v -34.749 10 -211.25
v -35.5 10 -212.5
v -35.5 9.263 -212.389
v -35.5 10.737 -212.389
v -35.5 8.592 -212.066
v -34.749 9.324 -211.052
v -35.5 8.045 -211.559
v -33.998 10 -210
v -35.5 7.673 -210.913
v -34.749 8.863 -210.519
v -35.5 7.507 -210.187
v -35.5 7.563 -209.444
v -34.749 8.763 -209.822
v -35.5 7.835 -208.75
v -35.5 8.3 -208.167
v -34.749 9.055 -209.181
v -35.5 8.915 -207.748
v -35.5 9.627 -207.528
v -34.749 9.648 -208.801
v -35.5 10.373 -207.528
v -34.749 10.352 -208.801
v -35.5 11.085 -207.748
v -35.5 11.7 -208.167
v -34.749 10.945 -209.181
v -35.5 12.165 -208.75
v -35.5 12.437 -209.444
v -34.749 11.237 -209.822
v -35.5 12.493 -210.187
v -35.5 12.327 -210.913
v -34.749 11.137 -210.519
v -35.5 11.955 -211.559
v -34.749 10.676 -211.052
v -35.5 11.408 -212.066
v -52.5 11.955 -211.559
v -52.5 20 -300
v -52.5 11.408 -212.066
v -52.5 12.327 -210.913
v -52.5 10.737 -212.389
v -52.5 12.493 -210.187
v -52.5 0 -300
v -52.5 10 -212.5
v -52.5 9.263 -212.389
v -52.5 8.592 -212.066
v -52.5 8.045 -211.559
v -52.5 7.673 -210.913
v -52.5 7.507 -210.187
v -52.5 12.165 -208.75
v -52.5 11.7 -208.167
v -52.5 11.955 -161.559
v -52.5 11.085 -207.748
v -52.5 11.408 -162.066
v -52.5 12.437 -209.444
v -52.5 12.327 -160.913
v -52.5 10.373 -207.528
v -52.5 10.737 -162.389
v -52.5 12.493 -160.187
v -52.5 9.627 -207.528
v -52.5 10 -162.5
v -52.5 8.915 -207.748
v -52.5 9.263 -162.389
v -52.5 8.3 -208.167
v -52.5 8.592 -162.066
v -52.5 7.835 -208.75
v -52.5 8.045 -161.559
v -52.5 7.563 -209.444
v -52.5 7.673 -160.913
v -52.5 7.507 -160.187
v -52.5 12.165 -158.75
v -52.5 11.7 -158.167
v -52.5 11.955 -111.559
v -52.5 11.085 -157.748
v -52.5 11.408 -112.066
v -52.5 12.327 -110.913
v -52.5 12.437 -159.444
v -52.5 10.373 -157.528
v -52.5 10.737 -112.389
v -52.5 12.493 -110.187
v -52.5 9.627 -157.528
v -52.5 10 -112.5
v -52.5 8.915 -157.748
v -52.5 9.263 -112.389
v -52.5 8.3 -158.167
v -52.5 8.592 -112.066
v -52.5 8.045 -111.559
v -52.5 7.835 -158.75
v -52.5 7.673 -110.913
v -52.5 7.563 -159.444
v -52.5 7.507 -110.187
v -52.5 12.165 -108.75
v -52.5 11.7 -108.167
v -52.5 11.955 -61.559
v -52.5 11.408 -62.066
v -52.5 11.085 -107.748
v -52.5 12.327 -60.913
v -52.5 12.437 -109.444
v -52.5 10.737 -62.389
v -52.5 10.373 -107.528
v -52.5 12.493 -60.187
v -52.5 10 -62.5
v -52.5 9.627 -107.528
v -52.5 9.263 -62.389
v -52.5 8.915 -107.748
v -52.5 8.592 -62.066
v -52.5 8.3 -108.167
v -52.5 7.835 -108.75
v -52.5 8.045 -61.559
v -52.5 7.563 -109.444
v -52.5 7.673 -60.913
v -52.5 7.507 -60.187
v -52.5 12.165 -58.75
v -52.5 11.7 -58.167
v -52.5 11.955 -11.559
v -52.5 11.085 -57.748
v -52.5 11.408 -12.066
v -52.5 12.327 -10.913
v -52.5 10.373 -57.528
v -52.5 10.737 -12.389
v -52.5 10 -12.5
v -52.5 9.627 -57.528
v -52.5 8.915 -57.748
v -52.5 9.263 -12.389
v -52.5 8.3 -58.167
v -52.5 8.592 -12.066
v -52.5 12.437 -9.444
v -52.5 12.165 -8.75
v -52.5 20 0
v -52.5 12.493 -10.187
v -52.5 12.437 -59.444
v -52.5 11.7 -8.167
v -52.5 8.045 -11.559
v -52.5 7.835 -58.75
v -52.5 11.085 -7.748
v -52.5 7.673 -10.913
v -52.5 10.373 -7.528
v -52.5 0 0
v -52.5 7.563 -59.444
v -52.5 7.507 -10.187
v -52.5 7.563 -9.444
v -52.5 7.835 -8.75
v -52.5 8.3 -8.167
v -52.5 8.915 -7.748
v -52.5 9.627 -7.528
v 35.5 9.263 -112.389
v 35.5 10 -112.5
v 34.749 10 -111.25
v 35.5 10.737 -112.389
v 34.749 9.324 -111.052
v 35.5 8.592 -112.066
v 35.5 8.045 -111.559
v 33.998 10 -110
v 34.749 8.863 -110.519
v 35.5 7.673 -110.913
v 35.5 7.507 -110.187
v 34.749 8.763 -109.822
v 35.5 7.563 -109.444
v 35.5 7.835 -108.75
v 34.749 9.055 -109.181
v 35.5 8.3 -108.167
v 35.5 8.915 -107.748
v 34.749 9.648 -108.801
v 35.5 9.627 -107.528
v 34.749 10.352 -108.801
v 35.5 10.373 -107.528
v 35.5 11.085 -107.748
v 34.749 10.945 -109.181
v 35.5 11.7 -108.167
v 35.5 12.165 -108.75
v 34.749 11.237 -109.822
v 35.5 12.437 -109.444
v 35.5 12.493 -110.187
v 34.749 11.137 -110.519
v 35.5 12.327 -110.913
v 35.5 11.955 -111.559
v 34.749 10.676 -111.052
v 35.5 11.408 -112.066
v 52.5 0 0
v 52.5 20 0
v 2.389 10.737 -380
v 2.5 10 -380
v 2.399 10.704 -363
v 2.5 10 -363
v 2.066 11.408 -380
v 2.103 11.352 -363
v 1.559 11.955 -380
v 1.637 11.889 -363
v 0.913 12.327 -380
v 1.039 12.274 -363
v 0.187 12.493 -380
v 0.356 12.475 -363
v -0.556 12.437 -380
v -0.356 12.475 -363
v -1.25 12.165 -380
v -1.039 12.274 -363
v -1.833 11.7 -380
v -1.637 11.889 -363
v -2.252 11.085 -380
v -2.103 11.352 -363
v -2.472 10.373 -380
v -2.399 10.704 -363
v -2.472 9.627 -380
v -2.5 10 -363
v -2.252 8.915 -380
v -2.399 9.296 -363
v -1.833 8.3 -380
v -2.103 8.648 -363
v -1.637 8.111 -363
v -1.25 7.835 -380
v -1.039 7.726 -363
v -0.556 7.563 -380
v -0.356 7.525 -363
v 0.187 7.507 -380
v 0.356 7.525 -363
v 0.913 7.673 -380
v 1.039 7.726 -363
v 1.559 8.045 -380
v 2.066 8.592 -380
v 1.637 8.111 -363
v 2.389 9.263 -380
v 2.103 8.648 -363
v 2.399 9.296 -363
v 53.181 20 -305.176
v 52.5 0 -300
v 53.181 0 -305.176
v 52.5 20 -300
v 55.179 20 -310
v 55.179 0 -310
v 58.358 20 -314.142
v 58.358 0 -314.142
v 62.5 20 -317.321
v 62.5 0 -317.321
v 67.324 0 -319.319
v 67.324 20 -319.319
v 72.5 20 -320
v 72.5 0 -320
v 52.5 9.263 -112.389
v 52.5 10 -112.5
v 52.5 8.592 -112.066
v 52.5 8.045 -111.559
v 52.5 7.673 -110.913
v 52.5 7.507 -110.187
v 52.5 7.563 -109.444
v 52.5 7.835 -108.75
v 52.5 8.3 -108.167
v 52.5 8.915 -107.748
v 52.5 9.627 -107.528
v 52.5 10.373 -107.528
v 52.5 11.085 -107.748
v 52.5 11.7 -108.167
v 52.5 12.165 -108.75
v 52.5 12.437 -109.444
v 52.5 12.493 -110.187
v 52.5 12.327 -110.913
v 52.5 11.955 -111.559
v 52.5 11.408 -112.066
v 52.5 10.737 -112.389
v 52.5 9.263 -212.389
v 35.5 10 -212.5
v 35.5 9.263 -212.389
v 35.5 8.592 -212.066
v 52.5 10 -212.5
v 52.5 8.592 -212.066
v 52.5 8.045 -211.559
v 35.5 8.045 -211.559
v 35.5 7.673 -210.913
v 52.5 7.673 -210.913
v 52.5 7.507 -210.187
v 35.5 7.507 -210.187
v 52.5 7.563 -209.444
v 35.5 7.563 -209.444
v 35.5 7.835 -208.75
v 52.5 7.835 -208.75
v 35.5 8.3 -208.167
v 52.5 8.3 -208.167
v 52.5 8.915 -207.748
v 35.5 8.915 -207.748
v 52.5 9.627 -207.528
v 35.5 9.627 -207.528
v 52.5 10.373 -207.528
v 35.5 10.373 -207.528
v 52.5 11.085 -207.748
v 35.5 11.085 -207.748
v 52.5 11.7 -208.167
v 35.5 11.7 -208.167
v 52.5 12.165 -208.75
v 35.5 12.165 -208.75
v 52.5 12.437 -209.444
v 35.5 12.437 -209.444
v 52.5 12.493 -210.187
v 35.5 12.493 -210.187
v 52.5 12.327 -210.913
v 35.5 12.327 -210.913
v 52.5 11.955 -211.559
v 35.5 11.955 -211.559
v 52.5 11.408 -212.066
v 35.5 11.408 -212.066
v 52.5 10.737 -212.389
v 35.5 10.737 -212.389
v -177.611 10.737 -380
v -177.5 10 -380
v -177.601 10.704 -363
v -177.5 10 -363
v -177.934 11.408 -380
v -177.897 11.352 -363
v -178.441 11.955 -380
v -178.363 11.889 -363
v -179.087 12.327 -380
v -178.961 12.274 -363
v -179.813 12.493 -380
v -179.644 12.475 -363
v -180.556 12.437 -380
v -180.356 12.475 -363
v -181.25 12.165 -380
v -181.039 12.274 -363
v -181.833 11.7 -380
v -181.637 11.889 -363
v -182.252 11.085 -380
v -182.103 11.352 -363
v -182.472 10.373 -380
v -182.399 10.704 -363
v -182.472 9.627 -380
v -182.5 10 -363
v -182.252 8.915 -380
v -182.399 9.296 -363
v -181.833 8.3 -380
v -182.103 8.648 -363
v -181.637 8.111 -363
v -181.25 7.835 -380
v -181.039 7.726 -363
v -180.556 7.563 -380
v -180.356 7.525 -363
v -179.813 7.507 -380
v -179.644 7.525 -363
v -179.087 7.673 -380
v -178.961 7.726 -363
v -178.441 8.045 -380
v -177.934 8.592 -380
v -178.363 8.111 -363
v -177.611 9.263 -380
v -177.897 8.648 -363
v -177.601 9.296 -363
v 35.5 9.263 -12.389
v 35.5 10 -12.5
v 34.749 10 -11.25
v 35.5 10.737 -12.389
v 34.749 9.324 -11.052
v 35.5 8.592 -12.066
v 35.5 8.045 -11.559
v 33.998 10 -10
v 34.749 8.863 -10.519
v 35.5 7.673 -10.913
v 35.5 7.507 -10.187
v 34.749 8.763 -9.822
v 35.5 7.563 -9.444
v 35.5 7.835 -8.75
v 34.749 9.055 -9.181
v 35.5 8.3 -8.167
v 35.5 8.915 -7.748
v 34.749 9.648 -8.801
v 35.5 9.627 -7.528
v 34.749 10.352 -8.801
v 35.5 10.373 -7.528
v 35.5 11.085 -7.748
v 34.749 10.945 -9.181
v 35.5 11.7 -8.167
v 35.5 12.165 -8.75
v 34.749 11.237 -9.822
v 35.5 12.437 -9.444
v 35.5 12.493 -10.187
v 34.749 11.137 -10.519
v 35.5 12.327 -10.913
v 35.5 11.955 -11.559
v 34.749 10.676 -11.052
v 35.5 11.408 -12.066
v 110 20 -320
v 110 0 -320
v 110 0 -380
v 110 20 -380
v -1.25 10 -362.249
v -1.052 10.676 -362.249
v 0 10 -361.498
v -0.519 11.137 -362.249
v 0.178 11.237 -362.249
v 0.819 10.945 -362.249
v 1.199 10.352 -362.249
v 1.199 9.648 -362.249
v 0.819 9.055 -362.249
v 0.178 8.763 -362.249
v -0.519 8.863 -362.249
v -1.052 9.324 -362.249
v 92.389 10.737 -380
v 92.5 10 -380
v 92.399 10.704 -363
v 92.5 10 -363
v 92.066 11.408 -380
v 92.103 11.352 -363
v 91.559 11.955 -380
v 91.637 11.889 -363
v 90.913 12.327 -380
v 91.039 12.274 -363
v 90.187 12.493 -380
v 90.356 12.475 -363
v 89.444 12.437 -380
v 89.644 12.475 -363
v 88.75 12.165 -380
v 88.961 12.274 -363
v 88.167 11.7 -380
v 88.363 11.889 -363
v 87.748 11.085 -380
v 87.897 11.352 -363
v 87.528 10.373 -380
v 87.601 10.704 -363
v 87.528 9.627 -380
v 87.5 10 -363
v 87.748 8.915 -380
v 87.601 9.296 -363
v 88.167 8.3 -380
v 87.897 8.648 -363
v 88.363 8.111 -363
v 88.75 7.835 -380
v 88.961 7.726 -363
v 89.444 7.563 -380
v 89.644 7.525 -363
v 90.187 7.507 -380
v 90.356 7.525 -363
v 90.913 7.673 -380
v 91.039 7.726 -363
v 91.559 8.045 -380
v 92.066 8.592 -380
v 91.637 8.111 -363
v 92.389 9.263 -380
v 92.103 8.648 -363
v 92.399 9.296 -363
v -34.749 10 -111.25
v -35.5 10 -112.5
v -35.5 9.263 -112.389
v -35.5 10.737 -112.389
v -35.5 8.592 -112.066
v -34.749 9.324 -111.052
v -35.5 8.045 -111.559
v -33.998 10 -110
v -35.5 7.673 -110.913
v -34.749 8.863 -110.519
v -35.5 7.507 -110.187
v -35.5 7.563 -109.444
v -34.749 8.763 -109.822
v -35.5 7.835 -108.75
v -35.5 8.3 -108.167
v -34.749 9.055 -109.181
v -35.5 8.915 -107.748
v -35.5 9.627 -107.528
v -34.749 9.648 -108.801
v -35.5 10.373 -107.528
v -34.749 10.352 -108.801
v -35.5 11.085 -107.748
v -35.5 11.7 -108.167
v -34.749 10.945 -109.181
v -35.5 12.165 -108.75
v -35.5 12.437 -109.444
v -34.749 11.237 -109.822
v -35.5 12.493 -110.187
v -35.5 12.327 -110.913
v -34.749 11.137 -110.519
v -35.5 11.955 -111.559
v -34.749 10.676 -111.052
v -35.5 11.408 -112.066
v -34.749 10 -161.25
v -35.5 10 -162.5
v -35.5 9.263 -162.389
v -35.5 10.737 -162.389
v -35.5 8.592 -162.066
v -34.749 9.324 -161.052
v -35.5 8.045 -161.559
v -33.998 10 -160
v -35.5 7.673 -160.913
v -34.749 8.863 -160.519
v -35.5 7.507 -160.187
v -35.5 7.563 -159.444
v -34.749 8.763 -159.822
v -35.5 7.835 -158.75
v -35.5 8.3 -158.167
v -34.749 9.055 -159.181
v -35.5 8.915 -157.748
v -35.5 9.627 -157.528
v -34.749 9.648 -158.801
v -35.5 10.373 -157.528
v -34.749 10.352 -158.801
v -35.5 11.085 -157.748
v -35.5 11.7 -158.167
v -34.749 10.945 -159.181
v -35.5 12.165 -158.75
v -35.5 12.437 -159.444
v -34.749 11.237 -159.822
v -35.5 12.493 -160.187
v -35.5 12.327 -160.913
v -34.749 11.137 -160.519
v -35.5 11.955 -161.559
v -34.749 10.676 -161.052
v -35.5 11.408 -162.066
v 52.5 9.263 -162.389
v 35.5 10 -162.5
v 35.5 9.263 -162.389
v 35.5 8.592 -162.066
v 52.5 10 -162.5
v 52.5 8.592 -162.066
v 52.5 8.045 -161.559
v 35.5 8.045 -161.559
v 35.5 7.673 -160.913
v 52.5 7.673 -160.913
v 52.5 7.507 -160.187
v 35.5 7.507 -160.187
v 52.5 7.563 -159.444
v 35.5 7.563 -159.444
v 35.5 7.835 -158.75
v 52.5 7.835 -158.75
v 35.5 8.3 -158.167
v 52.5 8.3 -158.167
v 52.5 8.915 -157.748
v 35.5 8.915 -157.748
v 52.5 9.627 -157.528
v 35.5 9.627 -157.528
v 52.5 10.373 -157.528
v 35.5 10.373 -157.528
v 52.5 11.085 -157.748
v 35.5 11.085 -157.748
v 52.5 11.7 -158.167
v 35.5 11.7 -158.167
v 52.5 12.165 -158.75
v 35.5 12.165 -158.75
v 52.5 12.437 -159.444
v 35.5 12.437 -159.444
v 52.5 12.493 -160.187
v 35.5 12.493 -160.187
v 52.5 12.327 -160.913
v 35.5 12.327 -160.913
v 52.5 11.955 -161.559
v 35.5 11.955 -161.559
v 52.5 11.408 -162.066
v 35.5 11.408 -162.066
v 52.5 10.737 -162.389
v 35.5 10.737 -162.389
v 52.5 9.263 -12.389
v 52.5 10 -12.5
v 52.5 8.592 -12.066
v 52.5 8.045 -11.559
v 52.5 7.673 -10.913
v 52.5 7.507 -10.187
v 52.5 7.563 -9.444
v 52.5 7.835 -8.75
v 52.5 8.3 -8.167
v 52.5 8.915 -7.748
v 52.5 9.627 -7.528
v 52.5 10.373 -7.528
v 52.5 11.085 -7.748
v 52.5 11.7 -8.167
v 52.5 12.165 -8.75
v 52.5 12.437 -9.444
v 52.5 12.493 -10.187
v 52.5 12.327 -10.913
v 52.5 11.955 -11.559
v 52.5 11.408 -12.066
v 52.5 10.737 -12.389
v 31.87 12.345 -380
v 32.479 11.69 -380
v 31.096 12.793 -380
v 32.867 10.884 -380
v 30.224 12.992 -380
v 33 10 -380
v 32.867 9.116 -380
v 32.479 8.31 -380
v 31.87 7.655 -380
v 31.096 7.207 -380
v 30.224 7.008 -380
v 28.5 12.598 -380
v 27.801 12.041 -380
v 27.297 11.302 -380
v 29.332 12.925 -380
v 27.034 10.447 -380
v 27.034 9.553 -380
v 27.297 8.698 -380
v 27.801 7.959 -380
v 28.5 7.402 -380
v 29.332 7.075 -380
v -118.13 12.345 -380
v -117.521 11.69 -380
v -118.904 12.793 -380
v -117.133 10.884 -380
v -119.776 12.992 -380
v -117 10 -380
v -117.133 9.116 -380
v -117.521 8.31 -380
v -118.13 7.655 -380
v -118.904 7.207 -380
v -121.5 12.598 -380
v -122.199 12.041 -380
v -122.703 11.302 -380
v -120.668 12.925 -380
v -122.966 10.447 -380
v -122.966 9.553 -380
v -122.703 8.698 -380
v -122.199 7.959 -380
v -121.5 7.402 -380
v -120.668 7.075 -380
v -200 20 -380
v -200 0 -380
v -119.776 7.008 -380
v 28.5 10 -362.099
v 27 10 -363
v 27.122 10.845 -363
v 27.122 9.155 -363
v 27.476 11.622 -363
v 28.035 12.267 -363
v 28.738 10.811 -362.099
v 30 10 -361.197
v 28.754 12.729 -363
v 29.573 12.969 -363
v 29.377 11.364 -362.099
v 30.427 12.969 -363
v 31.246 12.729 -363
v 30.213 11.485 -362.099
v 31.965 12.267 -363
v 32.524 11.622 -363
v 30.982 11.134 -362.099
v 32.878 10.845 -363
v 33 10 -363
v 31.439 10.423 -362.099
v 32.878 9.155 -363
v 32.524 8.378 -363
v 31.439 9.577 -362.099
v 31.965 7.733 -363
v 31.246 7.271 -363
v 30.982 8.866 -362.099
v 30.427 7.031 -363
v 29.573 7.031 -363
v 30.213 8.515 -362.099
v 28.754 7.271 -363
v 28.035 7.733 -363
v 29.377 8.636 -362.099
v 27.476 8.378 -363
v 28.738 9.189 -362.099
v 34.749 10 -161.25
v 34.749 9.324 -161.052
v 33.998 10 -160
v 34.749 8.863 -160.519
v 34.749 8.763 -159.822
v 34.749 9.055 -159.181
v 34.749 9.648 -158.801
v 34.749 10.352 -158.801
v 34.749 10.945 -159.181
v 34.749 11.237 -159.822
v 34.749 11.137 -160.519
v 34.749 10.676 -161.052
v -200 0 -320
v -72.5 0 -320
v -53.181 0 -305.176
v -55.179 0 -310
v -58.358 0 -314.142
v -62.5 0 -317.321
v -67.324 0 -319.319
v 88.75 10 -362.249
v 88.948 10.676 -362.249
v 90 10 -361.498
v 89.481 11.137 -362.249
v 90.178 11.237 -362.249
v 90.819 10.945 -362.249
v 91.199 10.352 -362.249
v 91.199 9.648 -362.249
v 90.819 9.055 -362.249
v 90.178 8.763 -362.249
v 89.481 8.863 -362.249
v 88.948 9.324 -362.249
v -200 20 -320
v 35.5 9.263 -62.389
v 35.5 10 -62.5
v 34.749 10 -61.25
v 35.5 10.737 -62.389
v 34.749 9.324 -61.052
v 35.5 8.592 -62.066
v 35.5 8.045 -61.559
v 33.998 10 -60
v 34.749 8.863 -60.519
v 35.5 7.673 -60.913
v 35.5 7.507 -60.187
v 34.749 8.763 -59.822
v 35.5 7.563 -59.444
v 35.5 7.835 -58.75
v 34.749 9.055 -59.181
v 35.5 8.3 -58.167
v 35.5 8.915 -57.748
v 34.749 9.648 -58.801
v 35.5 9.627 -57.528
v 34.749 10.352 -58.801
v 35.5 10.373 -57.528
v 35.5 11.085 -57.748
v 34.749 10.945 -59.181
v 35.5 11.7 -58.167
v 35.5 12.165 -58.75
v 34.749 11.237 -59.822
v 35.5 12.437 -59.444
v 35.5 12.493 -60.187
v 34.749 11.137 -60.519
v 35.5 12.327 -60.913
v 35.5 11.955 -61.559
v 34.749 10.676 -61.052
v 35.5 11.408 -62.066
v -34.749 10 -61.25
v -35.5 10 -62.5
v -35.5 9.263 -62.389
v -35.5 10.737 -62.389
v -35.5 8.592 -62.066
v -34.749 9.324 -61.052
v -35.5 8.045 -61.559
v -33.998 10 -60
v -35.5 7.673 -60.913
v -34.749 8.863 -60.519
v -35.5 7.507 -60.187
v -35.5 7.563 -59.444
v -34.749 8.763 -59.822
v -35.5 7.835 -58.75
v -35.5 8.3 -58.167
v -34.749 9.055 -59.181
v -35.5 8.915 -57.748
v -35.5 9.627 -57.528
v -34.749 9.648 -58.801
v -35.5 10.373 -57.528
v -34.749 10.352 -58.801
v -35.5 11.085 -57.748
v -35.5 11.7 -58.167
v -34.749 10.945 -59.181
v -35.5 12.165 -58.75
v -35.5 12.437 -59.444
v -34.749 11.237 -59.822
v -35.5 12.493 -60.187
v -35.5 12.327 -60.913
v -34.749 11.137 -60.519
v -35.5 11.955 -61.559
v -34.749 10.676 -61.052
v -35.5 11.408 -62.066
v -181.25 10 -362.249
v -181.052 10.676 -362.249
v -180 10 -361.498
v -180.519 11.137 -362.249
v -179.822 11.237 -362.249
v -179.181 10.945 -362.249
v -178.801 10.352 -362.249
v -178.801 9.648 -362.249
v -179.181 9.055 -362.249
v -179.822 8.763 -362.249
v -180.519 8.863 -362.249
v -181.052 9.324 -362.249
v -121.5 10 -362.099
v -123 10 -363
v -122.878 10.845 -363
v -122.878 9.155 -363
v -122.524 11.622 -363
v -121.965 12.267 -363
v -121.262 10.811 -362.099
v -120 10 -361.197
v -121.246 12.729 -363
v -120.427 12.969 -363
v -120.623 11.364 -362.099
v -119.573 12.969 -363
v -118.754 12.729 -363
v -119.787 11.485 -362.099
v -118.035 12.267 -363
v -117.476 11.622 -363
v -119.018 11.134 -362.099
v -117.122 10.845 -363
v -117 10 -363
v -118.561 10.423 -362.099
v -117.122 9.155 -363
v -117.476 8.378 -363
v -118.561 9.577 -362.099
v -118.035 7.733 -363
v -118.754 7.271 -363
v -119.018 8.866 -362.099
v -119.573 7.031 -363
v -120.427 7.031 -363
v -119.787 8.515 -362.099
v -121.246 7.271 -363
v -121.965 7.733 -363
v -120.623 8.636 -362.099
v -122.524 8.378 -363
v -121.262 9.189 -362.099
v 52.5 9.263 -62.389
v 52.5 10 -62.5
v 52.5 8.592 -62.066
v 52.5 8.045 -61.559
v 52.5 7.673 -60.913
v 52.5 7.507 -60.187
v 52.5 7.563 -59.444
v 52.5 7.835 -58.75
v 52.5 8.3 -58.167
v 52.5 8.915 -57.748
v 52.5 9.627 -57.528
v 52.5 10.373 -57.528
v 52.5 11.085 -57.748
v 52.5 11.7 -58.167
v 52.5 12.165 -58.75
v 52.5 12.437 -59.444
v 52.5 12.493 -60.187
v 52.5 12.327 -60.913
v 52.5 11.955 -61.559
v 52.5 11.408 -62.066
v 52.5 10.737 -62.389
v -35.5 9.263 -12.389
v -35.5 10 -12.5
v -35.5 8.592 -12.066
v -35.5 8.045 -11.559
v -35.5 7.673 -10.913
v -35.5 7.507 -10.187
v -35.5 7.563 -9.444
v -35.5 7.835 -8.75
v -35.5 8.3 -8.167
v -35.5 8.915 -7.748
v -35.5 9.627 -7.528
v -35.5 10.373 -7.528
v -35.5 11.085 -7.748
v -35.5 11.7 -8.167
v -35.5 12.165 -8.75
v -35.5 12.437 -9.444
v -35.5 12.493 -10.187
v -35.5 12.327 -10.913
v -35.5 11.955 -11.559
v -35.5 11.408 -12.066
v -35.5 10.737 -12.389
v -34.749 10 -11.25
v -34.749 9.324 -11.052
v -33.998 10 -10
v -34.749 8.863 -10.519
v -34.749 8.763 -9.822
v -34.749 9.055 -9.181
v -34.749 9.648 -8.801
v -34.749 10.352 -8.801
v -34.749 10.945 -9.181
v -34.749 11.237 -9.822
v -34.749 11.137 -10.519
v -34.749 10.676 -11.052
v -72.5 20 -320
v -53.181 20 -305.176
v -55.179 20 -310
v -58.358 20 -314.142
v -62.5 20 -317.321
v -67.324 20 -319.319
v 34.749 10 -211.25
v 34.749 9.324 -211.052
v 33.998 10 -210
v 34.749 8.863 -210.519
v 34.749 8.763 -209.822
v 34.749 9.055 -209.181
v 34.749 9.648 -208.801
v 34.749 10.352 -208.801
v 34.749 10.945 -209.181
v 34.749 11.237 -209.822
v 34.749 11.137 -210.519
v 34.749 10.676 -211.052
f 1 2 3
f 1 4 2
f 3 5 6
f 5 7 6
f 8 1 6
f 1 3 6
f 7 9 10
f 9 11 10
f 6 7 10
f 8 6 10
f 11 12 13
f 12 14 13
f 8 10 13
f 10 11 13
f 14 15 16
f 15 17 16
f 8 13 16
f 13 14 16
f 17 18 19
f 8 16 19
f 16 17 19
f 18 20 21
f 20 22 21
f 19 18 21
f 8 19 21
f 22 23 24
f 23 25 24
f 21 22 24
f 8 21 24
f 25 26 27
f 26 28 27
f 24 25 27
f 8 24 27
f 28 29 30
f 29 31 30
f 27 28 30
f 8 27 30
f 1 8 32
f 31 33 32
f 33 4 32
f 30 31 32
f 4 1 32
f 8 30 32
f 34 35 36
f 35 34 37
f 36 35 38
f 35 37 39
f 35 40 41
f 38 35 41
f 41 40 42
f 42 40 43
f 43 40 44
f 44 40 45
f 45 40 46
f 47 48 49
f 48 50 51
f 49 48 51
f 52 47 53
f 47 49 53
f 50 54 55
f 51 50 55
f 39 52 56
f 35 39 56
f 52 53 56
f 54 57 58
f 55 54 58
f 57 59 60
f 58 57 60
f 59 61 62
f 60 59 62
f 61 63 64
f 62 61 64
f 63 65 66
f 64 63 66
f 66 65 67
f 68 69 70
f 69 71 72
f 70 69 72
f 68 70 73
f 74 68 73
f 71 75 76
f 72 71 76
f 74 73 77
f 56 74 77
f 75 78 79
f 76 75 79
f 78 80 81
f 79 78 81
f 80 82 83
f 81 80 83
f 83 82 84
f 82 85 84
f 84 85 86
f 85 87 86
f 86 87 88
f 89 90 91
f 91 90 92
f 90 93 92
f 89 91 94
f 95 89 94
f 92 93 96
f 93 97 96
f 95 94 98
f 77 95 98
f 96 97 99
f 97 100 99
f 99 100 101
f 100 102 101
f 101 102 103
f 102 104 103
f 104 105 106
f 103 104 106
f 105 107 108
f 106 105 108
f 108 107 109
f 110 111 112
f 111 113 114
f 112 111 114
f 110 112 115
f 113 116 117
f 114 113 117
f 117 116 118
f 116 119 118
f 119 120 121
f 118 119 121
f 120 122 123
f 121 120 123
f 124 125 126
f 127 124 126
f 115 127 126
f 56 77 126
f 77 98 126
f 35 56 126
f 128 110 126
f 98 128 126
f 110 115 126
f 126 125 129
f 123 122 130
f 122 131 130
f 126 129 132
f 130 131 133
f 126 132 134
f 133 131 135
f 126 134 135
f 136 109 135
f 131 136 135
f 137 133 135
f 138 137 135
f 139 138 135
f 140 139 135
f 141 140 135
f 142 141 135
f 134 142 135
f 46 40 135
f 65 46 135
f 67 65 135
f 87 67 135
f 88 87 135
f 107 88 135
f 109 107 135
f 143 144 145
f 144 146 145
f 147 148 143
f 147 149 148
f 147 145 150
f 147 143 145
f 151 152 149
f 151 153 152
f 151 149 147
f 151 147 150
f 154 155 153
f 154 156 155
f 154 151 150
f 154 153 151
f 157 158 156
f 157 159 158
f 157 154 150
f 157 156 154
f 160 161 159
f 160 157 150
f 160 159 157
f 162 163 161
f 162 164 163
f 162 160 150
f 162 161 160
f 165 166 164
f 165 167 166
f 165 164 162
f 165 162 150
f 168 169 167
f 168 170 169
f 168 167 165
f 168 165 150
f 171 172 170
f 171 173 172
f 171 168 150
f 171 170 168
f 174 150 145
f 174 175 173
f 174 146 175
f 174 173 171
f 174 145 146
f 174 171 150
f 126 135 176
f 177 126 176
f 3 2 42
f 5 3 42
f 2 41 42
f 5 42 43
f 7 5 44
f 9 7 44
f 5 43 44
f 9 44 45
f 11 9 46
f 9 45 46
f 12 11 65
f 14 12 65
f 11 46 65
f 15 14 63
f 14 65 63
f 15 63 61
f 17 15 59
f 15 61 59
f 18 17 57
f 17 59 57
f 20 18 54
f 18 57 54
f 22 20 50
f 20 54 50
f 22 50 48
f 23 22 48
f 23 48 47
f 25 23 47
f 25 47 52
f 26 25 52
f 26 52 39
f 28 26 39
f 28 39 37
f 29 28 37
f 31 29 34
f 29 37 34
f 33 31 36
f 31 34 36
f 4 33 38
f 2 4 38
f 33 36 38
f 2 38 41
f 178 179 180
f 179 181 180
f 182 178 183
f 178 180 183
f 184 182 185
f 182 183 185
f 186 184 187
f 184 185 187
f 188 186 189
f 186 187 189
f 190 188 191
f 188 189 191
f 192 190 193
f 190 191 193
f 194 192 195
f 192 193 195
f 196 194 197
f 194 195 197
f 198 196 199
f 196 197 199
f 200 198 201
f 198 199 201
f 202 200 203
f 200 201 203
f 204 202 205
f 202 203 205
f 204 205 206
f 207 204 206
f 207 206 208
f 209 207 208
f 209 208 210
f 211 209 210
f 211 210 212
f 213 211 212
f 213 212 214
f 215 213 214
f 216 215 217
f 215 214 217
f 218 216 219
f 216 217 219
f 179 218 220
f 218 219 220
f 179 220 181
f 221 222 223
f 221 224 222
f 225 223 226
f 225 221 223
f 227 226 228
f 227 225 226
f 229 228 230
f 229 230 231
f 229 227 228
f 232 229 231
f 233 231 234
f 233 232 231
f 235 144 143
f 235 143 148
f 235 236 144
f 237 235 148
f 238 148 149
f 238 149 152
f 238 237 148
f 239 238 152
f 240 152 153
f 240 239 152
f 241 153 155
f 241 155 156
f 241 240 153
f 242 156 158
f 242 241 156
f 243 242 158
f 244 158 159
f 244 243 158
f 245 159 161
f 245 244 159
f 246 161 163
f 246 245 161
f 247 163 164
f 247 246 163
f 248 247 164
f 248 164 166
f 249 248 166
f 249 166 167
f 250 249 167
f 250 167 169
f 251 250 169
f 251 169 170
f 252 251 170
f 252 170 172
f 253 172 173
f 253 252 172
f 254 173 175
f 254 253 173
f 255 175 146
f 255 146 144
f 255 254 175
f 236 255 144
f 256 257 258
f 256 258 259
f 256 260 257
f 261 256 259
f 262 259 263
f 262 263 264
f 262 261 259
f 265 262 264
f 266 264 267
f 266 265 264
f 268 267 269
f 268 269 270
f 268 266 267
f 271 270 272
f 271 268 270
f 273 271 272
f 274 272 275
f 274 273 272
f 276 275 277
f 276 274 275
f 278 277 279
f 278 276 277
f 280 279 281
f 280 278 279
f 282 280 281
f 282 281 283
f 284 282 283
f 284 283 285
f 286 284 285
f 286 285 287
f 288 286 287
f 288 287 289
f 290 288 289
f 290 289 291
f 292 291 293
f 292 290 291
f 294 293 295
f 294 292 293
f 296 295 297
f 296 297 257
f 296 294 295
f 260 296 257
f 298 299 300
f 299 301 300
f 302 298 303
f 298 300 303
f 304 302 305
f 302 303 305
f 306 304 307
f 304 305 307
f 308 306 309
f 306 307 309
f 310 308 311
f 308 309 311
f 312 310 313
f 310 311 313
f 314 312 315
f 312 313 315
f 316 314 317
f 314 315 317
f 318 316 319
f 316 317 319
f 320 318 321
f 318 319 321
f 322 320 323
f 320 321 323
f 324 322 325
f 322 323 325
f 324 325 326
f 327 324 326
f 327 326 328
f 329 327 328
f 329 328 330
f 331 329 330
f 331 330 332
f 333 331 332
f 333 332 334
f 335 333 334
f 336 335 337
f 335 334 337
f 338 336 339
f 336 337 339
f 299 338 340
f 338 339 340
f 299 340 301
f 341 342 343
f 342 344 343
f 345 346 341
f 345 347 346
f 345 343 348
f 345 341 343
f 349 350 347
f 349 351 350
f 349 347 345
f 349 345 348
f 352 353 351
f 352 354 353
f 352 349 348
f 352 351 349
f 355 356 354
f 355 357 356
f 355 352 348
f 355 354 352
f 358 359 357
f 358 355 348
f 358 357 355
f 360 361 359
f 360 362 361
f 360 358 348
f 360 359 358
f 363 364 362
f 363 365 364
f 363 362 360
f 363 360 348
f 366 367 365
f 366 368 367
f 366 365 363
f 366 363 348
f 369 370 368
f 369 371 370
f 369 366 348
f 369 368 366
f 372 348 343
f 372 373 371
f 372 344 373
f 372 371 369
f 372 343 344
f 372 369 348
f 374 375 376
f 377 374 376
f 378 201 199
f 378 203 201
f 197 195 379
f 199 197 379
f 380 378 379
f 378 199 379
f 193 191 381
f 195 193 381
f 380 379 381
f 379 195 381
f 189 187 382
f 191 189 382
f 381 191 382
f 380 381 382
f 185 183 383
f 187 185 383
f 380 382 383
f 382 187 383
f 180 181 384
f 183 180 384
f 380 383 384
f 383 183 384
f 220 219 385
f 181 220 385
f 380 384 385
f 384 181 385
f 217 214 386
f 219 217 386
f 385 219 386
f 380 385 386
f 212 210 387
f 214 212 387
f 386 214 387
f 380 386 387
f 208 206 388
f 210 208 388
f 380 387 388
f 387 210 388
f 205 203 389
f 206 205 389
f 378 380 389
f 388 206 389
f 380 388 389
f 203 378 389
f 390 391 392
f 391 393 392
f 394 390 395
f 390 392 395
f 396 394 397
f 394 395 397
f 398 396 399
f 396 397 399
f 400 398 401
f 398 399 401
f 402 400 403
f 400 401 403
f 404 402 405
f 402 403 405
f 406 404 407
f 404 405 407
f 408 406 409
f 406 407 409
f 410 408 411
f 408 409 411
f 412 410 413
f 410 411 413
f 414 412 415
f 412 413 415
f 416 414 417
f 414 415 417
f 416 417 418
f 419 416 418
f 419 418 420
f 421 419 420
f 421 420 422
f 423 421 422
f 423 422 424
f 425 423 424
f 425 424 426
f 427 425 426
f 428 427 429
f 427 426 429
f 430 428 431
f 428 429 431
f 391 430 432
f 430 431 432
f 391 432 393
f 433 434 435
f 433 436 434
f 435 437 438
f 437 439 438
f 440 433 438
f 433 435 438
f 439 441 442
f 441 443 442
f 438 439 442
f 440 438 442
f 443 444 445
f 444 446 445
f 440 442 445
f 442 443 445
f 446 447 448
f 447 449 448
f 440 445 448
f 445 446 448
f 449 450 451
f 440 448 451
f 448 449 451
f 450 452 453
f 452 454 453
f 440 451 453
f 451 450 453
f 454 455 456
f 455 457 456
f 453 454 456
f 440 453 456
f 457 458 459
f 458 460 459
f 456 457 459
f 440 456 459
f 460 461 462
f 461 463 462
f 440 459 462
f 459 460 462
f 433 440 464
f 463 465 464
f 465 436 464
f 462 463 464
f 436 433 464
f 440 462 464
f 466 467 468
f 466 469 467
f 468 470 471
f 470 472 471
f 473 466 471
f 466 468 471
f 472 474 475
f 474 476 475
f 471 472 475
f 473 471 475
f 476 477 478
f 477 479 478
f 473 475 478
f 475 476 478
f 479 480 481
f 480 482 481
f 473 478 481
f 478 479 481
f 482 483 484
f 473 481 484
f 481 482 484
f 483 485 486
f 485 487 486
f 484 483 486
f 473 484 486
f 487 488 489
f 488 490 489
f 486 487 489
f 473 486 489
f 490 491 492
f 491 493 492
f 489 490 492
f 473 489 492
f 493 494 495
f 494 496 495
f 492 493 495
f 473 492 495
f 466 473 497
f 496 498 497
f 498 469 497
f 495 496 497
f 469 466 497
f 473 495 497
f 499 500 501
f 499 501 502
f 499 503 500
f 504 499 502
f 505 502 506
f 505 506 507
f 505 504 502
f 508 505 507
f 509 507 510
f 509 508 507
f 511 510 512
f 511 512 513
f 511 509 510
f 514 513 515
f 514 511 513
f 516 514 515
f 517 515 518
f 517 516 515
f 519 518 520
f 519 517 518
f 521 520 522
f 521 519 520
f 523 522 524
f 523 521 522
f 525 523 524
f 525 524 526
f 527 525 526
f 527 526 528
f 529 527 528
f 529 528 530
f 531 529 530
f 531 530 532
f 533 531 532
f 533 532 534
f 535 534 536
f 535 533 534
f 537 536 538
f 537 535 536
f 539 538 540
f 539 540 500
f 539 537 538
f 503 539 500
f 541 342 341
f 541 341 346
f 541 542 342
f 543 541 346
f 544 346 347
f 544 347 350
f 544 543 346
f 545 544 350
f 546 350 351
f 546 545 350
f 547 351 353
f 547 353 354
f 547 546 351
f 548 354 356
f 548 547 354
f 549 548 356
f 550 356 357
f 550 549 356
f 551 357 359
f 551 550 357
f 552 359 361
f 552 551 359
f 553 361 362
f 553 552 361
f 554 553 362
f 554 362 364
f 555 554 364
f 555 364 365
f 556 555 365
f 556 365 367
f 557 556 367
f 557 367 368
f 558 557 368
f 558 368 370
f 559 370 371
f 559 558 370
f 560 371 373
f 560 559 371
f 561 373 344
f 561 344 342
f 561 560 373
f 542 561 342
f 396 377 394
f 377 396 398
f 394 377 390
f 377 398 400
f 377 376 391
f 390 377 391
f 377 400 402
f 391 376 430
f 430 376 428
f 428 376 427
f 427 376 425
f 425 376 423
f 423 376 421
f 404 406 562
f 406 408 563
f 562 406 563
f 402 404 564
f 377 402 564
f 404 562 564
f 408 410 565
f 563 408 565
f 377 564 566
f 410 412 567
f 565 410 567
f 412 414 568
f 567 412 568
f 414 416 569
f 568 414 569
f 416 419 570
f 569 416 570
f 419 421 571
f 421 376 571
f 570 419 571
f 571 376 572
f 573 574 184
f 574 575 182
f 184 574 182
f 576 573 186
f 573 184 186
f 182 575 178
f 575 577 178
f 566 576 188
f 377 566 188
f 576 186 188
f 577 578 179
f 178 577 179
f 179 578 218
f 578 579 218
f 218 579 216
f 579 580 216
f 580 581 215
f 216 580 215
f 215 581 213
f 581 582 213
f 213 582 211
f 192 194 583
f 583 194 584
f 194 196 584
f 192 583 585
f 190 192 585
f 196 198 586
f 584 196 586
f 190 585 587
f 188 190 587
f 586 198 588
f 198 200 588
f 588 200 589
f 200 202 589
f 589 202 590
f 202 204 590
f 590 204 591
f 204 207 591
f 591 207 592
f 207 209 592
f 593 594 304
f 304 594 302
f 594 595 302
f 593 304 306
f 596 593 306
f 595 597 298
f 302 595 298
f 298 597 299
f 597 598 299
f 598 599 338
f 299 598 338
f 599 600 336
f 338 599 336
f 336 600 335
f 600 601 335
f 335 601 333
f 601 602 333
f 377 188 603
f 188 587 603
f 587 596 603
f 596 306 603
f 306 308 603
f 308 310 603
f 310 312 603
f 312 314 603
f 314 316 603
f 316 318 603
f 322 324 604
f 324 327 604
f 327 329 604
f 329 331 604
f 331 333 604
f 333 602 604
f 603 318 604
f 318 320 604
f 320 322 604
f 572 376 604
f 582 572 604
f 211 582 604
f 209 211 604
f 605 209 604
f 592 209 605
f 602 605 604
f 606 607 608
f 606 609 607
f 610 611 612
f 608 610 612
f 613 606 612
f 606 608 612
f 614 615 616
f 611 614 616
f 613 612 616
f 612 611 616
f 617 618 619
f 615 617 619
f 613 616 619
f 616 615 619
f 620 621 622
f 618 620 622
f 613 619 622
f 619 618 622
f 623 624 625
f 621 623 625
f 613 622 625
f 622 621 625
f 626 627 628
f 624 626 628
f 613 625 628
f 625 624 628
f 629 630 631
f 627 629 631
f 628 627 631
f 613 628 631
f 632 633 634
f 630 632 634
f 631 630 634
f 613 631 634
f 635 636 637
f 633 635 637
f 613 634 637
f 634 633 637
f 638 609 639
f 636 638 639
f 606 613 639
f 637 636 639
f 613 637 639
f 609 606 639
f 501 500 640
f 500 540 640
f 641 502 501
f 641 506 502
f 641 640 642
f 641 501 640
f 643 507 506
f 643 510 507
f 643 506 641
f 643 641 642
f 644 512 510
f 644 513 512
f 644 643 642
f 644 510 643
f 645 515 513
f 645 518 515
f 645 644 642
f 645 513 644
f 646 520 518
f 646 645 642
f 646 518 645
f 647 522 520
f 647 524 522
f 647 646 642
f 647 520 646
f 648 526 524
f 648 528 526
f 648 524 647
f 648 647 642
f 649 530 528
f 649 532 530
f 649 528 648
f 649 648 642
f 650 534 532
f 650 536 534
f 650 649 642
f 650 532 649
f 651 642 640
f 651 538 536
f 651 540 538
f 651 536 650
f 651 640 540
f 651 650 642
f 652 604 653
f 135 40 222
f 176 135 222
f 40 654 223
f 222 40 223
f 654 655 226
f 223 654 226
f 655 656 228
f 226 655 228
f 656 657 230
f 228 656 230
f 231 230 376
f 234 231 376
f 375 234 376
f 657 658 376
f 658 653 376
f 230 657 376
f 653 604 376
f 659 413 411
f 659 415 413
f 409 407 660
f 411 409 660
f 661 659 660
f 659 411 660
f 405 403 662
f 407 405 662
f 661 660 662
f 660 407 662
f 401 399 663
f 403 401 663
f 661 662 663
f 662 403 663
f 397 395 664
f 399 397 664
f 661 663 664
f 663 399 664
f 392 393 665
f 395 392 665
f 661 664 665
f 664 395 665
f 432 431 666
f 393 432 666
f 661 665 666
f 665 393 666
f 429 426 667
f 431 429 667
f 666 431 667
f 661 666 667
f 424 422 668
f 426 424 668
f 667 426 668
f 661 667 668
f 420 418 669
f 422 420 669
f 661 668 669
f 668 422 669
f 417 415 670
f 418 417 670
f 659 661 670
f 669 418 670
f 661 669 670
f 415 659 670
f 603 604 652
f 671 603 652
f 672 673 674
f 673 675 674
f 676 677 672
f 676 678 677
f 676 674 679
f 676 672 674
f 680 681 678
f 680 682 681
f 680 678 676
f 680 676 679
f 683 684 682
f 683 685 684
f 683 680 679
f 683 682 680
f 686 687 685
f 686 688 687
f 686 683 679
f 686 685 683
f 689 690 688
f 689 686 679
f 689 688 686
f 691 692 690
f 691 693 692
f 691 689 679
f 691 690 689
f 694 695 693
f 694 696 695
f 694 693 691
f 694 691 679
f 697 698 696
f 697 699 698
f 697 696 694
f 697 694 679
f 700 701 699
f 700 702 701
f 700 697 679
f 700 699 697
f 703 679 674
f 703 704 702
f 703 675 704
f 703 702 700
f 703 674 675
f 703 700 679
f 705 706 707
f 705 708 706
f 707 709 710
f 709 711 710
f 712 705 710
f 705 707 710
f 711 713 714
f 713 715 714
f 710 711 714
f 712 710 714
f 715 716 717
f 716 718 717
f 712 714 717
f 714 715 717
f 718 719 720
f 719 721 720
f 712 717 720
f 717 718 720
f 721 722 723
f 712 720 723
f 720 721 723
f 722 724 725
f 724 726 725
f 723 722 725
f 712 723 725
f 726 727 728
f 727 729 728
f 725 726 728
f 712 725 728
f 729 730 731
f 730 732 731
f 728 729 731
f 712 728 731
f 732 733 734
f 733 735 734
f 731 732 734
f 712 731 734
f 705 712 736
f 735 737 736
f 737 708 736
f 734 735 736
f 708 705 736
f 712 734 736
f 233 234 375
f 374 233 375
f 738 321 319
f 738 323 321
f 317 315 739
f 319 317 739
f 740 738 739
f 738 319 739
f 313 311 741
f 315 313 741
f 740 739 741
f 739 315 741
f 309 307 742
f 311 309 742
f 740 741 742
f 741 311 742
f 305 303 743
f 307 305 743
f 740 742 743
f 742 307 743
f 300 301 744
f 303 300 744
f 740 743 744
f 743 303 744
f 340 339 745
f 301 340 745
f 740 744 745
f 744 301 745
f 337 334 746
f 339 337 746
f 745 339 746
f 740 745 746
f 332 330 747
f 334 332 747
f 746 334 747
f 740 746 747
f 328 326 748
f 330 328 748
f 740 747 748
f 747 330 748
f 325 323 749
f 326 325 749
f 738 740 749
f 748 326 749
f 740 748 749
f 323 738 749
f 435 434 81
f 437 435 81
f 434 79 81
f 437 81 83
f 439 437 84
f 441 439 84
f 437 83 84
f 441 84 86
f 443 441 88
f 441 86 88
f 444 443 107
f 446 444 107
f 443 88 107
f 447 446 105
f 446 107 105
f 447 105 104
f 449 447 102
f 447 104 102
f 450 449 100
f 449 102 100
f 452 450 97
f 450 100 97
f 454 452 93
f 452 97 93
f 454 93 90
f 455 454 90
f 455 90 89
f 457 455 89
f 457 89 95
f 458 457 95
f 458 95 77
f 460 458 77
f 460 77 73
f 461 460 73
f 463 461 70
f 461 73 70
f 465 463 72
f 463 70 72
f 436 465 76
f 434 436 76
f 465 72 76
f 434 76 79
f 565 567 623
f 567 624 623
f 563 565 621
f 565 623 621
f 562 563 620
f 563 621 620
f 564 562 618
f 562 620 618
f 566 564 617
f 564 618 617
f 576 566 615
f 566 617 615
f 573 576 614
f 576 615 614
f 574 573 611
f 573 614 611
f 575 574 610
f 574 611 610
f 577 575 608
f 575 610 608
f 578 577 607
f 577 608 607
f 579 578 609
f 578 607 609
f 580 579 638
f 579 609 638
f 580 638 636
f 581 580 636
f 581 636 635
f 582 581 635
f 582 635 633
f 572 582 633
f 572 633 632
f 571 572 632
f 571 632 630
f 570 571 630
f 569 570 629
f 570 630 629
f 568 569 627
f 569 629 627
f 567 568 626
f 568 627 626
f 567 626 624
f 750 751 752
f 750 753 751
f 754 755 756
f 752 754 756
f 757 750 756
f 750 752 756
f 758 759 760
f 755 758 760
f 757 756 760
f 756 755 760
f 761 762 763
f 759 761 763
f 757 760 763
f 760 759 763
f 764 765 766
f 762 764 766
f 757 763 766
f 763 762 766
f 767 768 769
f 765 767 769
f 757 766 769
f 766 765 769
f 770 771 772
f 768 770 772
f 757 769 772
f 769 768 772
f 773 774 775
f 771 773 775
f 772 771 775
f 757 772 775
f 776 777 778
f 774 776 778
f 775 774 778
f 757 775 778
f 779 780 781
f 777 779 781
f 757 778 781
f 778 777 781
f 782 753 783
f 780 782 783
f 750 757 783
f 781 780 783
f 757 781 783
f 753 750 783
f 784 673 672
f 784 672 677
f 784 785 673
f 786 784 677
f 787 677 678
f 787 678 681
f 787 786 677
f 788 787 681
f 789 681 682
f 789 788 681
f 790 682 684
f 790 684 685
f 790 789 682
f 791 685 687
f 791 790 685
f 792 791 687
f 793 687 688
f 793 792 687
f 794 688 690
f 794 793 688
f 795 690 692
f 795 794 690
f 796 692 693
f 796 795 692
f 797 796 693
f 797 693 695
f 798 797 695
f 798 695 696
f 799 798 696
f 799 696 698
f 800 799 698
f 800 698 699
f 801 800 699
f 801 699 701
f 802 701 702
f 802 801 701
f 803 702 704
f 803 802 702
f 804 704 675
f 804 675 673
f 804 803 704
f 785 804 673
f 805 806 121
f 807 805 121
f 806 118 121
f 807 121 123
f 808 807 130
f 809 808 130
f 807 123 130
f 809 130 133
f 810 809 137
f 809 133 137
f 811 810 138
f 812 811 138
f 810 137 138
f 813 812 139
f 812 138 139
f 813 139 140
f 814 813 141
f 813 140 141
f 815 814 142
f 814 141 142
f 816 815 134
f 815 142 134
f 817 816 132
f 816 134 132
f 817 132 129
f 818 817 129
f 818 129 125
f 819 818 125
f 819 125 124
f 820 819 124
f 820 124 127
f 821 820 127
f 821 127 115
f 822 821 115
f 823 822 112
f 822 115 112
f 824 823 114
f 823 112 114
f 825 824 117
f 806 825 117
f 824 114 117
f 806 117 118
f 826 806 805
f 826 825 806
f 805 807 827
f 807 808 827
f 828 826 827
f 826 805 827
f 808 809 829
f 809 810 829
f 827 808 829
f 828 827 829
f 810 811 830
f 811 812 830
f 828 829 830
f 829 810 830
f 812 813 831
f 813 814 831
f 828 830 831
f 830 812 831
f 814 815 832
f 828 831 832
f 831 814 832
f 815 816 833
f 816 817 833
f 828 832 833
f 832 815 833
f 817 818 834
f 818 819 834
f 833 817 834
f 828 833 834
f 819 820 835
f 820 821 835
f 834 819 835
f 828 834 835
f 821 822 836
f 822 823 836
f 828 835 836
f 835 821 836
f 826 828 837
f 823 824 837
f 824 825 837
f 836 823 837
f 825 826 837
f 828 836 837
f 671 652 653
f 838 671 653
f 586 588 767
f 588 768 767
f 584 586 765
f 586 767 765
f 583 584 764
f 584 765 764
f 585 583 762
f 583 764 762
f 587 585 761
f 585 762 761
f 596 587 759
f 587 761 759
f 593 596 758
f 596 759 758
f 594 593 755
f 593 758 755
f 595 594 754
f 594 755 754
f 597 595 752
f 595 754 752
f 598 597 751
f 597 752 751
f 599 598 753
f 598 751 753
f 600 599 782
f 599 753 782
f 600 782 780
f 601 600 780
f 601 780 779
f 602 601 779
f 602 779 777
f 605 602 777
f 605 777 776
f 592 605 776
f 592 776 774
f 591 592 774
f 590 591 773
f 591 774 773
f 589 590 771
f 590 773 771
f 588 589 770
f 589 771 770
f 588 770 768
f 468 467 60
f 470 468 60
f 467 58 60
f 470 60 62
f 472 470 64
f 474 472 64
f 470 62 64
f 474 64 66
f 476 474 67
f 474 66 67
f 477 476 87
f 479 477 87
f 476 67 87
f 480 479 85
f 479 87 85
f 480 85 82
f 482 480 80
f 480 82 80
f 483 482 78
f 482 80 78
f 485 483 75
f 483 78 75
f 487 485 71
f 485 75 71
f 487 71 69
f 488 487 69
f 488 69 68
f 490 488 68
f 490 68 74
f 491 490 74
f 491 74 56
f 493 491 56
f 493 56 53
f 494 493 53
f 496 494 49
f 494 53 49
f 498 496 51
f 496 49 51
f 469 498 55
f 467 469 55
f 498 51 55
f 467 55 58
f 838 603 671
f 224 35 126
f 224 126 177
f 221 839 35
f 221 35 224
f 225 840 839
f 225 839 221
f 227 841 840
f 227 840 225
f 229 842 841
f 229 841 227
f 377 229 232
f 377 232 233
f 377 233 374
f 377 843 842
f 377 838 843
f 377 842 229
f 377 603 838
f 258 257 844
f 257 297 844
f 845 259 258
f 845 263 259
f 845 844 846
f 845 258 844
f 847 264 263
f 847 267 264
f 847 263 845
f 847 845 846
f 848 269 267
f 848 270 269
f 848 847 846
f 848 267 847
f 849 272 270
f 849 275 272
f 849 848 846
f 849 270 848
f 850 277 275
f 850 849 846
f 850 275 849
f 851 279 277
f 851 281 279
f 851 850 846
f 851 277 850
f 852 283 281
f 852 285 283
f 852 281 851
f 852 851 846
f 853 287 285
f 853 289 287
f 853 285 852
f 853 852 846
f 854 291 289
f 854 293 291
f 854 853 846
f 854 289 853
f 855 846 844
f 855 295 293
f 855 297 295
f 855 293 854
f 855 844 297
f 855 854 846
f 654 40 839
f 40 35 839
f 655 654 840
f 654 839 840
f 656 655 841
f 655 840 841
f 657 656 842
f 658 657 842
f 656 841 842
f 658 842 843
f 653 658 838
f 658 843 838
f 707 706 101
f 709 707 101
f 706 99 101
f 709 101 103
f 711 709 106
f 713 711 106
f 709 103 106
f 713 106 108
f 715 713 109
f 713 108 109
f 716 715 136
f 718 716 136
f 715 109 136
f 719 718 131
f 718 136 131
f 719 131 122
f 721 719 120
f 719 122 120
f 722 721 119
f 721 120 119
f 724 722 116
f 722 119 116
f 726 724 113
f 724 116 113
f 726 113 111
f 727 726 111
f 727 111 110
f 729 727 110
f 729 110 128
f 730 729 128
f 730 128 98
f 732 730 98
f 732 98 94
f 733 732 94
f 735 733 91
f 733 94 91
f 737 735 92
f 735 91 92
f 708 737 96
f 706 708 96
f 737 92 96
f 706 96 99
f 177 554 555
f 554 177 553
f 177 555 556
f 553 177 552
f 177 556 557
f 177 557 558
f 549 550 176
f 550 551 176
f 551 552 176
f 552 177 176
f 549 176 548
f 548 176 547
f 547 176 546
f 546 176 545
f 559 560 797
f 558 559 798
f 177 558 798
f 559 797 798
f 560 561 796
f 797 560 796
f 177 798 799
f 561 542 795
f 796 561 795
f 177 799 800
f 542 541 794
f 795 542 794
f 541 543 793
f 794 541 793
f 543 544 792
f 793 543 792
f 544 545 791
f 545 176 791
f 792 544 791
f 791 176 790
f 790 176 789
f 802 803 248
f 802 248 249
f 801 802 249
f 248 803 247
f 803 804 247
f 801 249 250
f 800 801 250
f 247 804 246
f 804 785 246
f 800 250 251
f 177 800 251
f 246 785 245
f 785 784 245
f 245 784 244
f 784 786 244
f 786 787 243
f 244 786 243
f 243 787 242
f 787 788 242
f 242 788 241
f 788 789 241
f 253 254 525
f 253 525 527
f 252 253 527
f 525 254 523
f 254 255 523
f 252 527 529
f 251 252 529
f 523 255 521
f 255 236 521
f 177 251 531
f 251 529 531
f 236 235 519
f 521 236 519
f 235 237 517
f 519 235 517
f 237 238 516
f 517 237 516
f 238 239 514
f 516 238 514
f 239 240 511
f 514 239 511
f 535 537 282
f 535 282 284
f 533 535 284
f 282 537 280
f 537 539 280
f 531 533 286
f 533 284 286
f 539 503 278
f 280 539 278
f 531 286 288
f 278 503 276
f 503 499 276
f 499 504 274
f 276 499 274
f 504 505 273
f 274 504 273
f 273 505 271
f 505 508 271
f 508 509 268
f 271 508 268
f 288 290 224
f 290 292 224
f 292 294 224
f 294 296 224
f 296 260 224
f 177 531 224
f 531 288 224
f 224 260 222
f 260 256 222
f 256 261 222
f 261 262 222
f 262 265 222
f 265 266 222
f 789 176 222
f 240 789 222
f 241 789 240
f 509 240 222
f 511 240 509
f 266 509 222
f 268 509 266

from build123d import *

# Parameters (mm, degrees)
AUFSATZ_LINEAR_AUSTRAGEN1_DEPTH       = 20
M6_GEWINDEBOHRUNG1_AT_2_COUNT         = 2
M6_GEWINDEBOHRUNG1_AT_2_PITCH         = 50
M6_GEWINDEBOHRUNG1_AT_3_COUNT         = 2
M6_GEWINDEBOHRUNG1_AT_3_PITCH         = 100
M6_GEWINDEBOHRUNG1_AT_4_COUNT         = 2
M6_GEWINDEBOHRUNG1_AT_4_PITCH         = 150
M6_GEWINDEBOHRUNG1_AT_5_COUNT         = 2
M6_GEWINDEBOHRUNG1_AT_5_PITCH         = 206.155281281
M6_GEWINDEBOHRUNG1_AT_6_COUNT         = 2
M6_GEWINDEBOHRUNG1_AT_6_PITCH         = 200
M6_GEWINDEBOHRUNG2_D                  = 5
M6_GEWINDEBOHRUNG2_DEPTH              = 17
M6_GEWINDEBOHRUNG2_TIP                = 1.502151548
VERRUNDUNG1_R                         = 20
F_6_0MM_TRANSITIONAL_STIFTLOCH1_D     = 6
F_6_0MM_TRANSITIONAL_STIFTLOCH1_DEPTH = 17
F_6_0MM_TRANSITIONAL_STIFTLOCH1_TIP   = 1.802581857


with BuildPart() as part:
    # Skizze1 → Aufsatz-Linear austragen1 (new body)
    with BuildSketch(Plane(origin=(0, 0, 0), x_dir=(1, 0, 0), z_dir=(0, 1, 0))):
        Polygon((-52.5, 0), (52.5, 0), (52.5, 320), (110, 320), (110, 380), (-200, 380), (-200, 320), (-52.5, 320), align=None)
    extrude(amount=AUFSATZ_LINEAR_AUSTRAGEN1_DEPTH)

    # Skizze4 → M6 Gewindebohrung1 (revolve, cut)
    with BuildSketch(Plane(origin=(52.5, 10, -10), x_dir=(0, 0, -1), z_dir=(0, 1, 0))):
        Polygon((0, 0), (0, 18.502151548), (2.5, 17), (2.5, 0), align=None)
    m6_gewindebohrung1 = revolve(axis=Axis((58.85, 10, -10), (-1, 0, 0)), mode=Mode.SUBTRACT)

    # M6 Gewindebohrung1 at 2: M6 Gewindebohrung1 ×2
    with Locations(*[(0, 0, -i * M6_GEWINDEBOHRUNG1_AT_2_PITCH) for i in range(1, M6_GEWINDEBOHRUNG1_AT_2_COUNT)]):
        add(m6_gewindebohrung1, mode=Mode.SUBTRACT)

    # M6 Gewindebohrung1 at 3: M6 Gewindebohrung1 ×2
    with Locations(*[(0, 0, -i * M6_GEWINDEBOHRUNG1_AT_3_PITCH) for i in range(1, M6_GEWINDEBOHRUNG1_AT_3_COUNT)]):
        add(m6_gewindebohrung1, mode=Mode.SUBTRACT)

    # M6 Gewindebohrung1 at 4: M6 Gewindebohrung1 ×2
    with Locations(*[(0, 0, -i * M6_GEWINDEBOHRUNG1_AT_4_PITCH) for i in range(1, M6_GEWINDEBOHRUNG1_AT_4_COUNT)]):
        add(m6_gewindebohrung1, mode=Mode.SUBTRACT)

    # M6 Gewindebohrung1 at 5: M6 Gewindebohrung1 ×2
    with Locations(*[Vector(0, 0.242535625, -0.9701425) * (i * M6_GEWINDEBOHRUNG1_AT_5_PITCH) for i in range(1, M6_GEWINDEBOHRUNG1_AT_5_COUNT)]):
        add(m6_gewindebohrung1, mode=Mode.SUBTRACT)

    # M6 Gewindebohrung1 at 6: M6 Gewindebohrung1 ×2
    with Locations(*[(0, 0, -i * M6_GEWINDEBOHRUNG1_AT_6_PITCH) for i in range(1, M6_GEWINDEBOHRUNG1_AT_6_COUNT)]):
        add(m6_gewindebohrung1, mode=Mode.SUBTRACT)

    # Spiegeln1: M6 Gewindebohrung1 across plane
    add(m6_gewindebohrung1.mirror(Plane(origin=(0, 0, 0), x_dir=(0, 0, 1), z_dir=(1, 0, 0))), mode=Mode.SUBTRACT)

    # Spiegeln1 copy 1 sketch → Spiegeln1 copy 1 (revolve, cut)
    with BuildSketch(Plane(origin=(-52.5, 10, -60), x_dir=(0, 0, -1), z_dir=(0, 1, 0))):
        Polygon((0, 0), (0, -18.502151548), (2.5, -17), (2.5, 0), align=None)
    revolve(axis=Axis((-58.85, 10, -60), (-1, 0, 0)), mode=Mode.SUBTRACT)

    # Spiegeln1 copy 2 sketch → Spiegeln1 copy 2 (revolve, cut)
    with BuildSketch(Plane(origin=(-52.5, 10, -110), x_dir=(0, 0, -1), z_dir=(0, 1, 0))):
        Polygon((0, 0), (0, -18.502151548), (2.5, -17), (2.5, 0), align=None)
    revolve(axis=Axis((-58.85, 10, -110), (-1, 0, 0)), mode=Mode.SUBTRACT)

    # Spiegeln1 copy 3 sketch → Spiegeln1 copy 3 (revolve, cut)
    with BuildSketch(Plane(origin=(-52.5, 10, -160), x_dir=(0, 0, -1), z_dir=(0, 1, 0))):
        Polygon((0, 0), (0, -18.502151548), (2.5, -17), (2.5, 0), align=None)
    revolve(axis=Axis((-58.85, 10, -160), (-1, 0, 0)), mode=Mode.SUBTRACT)

    # Spiegeln1 copy 4 sketch → Spiegeln1 copy 4 (revolve, cut)
    with BuildSketch(Plane(origin=(-52.5, 60, -210), x_dir=(0, 0, -1), z_dir=(0, 1, 0))):
        Polygon((0, 0), (0, -18.502151548), (2.5, -17), (2.5, 0), align=None)
    revolve(axis=Axis((-58.85, 60, -210), (-1, 0, 0)), mode=Mode.SUBTRACT)

    # Spiegeln1 copy 5 sketch → Spiegeln1 copy 5 (revolve, cut)
    with BuildSketch(Plane(origin=(-52.5, 10, -210), x_dir=(0, 0, -1), z_dir=(0, 1, 0))):
        Polygon((0, 0), (0, -18.502151548), (2.5, -17), (2.5, 0), align=None)
    revolve(axis=Axis((-58.85, 10, -210), (-1, 0, 0)), mode=Mode.SUBTRACT)

    # M6 Gewindebohrung2
    with Locations(Plane(origin=(0, 0, -380), x_dir=(-1, 0, 0), z_dir=(0, 0, -1))):
        with Locations((-90, 10), (180, 10), (0, 10)):
            Hole(M6_GEWINDEBOHRUNG2_D / 2, depth=M6_GEWINDEBOHRUNG2_DEPTH)
            with Locations((0, 0, -(M6_GEWINDEBOHRUNG2_DEPTH + M6_GEWINDEBOHRUNG2_TIP / 2))):  # 118° drill point
                Cone(0, M6_GEWINDEBOHRUNG2_D / 2, M6_GEWINDEBOHRUNG2_TIP, mode=Mode.SUBTRACT)

    # Verrundung1
    verrundung1_edges = [part.edges().sort_by_distance(p)[0] for p in [
        (-52.5, 10, -320),
        (52.5, 10, -320),
    ]]
    fillet(verrundung1_edges, radius=VERRUNDUNG1_R)

    # Ø6.0mm Transitional Stiftloch1
    with Locations(Plane(origin=(0, 0, -380), x_dir=(-1, 0, 0), z_dir=(0, 0, -1))):
        with Locations((120, 10), (-30, 10)):
            Hole(F_6_0MM_TRANSITIONAL_STIFTLOCH1_D / 2, depth=F_6_0MM_TRANSITIONAL_STIFTLOCH1_DEPTH)
            with Locations((0, 0, -(F_6_0MM_TRANSITIONAL_STIFTLOCH1_DEPTH + F_6_0MM_TRANSITIONAL_STIFTLOCH1_TIP / 2))):  # 118° drill point
                Cone(0, F_6_0MM_TRANSITIONAL_STIFTLOCH1_D / 2, F_6_0MM_TRANSITIONAL_STIFTLOCH1_TIP, mode=Mode.SUBTRACT)


solid = part.part
